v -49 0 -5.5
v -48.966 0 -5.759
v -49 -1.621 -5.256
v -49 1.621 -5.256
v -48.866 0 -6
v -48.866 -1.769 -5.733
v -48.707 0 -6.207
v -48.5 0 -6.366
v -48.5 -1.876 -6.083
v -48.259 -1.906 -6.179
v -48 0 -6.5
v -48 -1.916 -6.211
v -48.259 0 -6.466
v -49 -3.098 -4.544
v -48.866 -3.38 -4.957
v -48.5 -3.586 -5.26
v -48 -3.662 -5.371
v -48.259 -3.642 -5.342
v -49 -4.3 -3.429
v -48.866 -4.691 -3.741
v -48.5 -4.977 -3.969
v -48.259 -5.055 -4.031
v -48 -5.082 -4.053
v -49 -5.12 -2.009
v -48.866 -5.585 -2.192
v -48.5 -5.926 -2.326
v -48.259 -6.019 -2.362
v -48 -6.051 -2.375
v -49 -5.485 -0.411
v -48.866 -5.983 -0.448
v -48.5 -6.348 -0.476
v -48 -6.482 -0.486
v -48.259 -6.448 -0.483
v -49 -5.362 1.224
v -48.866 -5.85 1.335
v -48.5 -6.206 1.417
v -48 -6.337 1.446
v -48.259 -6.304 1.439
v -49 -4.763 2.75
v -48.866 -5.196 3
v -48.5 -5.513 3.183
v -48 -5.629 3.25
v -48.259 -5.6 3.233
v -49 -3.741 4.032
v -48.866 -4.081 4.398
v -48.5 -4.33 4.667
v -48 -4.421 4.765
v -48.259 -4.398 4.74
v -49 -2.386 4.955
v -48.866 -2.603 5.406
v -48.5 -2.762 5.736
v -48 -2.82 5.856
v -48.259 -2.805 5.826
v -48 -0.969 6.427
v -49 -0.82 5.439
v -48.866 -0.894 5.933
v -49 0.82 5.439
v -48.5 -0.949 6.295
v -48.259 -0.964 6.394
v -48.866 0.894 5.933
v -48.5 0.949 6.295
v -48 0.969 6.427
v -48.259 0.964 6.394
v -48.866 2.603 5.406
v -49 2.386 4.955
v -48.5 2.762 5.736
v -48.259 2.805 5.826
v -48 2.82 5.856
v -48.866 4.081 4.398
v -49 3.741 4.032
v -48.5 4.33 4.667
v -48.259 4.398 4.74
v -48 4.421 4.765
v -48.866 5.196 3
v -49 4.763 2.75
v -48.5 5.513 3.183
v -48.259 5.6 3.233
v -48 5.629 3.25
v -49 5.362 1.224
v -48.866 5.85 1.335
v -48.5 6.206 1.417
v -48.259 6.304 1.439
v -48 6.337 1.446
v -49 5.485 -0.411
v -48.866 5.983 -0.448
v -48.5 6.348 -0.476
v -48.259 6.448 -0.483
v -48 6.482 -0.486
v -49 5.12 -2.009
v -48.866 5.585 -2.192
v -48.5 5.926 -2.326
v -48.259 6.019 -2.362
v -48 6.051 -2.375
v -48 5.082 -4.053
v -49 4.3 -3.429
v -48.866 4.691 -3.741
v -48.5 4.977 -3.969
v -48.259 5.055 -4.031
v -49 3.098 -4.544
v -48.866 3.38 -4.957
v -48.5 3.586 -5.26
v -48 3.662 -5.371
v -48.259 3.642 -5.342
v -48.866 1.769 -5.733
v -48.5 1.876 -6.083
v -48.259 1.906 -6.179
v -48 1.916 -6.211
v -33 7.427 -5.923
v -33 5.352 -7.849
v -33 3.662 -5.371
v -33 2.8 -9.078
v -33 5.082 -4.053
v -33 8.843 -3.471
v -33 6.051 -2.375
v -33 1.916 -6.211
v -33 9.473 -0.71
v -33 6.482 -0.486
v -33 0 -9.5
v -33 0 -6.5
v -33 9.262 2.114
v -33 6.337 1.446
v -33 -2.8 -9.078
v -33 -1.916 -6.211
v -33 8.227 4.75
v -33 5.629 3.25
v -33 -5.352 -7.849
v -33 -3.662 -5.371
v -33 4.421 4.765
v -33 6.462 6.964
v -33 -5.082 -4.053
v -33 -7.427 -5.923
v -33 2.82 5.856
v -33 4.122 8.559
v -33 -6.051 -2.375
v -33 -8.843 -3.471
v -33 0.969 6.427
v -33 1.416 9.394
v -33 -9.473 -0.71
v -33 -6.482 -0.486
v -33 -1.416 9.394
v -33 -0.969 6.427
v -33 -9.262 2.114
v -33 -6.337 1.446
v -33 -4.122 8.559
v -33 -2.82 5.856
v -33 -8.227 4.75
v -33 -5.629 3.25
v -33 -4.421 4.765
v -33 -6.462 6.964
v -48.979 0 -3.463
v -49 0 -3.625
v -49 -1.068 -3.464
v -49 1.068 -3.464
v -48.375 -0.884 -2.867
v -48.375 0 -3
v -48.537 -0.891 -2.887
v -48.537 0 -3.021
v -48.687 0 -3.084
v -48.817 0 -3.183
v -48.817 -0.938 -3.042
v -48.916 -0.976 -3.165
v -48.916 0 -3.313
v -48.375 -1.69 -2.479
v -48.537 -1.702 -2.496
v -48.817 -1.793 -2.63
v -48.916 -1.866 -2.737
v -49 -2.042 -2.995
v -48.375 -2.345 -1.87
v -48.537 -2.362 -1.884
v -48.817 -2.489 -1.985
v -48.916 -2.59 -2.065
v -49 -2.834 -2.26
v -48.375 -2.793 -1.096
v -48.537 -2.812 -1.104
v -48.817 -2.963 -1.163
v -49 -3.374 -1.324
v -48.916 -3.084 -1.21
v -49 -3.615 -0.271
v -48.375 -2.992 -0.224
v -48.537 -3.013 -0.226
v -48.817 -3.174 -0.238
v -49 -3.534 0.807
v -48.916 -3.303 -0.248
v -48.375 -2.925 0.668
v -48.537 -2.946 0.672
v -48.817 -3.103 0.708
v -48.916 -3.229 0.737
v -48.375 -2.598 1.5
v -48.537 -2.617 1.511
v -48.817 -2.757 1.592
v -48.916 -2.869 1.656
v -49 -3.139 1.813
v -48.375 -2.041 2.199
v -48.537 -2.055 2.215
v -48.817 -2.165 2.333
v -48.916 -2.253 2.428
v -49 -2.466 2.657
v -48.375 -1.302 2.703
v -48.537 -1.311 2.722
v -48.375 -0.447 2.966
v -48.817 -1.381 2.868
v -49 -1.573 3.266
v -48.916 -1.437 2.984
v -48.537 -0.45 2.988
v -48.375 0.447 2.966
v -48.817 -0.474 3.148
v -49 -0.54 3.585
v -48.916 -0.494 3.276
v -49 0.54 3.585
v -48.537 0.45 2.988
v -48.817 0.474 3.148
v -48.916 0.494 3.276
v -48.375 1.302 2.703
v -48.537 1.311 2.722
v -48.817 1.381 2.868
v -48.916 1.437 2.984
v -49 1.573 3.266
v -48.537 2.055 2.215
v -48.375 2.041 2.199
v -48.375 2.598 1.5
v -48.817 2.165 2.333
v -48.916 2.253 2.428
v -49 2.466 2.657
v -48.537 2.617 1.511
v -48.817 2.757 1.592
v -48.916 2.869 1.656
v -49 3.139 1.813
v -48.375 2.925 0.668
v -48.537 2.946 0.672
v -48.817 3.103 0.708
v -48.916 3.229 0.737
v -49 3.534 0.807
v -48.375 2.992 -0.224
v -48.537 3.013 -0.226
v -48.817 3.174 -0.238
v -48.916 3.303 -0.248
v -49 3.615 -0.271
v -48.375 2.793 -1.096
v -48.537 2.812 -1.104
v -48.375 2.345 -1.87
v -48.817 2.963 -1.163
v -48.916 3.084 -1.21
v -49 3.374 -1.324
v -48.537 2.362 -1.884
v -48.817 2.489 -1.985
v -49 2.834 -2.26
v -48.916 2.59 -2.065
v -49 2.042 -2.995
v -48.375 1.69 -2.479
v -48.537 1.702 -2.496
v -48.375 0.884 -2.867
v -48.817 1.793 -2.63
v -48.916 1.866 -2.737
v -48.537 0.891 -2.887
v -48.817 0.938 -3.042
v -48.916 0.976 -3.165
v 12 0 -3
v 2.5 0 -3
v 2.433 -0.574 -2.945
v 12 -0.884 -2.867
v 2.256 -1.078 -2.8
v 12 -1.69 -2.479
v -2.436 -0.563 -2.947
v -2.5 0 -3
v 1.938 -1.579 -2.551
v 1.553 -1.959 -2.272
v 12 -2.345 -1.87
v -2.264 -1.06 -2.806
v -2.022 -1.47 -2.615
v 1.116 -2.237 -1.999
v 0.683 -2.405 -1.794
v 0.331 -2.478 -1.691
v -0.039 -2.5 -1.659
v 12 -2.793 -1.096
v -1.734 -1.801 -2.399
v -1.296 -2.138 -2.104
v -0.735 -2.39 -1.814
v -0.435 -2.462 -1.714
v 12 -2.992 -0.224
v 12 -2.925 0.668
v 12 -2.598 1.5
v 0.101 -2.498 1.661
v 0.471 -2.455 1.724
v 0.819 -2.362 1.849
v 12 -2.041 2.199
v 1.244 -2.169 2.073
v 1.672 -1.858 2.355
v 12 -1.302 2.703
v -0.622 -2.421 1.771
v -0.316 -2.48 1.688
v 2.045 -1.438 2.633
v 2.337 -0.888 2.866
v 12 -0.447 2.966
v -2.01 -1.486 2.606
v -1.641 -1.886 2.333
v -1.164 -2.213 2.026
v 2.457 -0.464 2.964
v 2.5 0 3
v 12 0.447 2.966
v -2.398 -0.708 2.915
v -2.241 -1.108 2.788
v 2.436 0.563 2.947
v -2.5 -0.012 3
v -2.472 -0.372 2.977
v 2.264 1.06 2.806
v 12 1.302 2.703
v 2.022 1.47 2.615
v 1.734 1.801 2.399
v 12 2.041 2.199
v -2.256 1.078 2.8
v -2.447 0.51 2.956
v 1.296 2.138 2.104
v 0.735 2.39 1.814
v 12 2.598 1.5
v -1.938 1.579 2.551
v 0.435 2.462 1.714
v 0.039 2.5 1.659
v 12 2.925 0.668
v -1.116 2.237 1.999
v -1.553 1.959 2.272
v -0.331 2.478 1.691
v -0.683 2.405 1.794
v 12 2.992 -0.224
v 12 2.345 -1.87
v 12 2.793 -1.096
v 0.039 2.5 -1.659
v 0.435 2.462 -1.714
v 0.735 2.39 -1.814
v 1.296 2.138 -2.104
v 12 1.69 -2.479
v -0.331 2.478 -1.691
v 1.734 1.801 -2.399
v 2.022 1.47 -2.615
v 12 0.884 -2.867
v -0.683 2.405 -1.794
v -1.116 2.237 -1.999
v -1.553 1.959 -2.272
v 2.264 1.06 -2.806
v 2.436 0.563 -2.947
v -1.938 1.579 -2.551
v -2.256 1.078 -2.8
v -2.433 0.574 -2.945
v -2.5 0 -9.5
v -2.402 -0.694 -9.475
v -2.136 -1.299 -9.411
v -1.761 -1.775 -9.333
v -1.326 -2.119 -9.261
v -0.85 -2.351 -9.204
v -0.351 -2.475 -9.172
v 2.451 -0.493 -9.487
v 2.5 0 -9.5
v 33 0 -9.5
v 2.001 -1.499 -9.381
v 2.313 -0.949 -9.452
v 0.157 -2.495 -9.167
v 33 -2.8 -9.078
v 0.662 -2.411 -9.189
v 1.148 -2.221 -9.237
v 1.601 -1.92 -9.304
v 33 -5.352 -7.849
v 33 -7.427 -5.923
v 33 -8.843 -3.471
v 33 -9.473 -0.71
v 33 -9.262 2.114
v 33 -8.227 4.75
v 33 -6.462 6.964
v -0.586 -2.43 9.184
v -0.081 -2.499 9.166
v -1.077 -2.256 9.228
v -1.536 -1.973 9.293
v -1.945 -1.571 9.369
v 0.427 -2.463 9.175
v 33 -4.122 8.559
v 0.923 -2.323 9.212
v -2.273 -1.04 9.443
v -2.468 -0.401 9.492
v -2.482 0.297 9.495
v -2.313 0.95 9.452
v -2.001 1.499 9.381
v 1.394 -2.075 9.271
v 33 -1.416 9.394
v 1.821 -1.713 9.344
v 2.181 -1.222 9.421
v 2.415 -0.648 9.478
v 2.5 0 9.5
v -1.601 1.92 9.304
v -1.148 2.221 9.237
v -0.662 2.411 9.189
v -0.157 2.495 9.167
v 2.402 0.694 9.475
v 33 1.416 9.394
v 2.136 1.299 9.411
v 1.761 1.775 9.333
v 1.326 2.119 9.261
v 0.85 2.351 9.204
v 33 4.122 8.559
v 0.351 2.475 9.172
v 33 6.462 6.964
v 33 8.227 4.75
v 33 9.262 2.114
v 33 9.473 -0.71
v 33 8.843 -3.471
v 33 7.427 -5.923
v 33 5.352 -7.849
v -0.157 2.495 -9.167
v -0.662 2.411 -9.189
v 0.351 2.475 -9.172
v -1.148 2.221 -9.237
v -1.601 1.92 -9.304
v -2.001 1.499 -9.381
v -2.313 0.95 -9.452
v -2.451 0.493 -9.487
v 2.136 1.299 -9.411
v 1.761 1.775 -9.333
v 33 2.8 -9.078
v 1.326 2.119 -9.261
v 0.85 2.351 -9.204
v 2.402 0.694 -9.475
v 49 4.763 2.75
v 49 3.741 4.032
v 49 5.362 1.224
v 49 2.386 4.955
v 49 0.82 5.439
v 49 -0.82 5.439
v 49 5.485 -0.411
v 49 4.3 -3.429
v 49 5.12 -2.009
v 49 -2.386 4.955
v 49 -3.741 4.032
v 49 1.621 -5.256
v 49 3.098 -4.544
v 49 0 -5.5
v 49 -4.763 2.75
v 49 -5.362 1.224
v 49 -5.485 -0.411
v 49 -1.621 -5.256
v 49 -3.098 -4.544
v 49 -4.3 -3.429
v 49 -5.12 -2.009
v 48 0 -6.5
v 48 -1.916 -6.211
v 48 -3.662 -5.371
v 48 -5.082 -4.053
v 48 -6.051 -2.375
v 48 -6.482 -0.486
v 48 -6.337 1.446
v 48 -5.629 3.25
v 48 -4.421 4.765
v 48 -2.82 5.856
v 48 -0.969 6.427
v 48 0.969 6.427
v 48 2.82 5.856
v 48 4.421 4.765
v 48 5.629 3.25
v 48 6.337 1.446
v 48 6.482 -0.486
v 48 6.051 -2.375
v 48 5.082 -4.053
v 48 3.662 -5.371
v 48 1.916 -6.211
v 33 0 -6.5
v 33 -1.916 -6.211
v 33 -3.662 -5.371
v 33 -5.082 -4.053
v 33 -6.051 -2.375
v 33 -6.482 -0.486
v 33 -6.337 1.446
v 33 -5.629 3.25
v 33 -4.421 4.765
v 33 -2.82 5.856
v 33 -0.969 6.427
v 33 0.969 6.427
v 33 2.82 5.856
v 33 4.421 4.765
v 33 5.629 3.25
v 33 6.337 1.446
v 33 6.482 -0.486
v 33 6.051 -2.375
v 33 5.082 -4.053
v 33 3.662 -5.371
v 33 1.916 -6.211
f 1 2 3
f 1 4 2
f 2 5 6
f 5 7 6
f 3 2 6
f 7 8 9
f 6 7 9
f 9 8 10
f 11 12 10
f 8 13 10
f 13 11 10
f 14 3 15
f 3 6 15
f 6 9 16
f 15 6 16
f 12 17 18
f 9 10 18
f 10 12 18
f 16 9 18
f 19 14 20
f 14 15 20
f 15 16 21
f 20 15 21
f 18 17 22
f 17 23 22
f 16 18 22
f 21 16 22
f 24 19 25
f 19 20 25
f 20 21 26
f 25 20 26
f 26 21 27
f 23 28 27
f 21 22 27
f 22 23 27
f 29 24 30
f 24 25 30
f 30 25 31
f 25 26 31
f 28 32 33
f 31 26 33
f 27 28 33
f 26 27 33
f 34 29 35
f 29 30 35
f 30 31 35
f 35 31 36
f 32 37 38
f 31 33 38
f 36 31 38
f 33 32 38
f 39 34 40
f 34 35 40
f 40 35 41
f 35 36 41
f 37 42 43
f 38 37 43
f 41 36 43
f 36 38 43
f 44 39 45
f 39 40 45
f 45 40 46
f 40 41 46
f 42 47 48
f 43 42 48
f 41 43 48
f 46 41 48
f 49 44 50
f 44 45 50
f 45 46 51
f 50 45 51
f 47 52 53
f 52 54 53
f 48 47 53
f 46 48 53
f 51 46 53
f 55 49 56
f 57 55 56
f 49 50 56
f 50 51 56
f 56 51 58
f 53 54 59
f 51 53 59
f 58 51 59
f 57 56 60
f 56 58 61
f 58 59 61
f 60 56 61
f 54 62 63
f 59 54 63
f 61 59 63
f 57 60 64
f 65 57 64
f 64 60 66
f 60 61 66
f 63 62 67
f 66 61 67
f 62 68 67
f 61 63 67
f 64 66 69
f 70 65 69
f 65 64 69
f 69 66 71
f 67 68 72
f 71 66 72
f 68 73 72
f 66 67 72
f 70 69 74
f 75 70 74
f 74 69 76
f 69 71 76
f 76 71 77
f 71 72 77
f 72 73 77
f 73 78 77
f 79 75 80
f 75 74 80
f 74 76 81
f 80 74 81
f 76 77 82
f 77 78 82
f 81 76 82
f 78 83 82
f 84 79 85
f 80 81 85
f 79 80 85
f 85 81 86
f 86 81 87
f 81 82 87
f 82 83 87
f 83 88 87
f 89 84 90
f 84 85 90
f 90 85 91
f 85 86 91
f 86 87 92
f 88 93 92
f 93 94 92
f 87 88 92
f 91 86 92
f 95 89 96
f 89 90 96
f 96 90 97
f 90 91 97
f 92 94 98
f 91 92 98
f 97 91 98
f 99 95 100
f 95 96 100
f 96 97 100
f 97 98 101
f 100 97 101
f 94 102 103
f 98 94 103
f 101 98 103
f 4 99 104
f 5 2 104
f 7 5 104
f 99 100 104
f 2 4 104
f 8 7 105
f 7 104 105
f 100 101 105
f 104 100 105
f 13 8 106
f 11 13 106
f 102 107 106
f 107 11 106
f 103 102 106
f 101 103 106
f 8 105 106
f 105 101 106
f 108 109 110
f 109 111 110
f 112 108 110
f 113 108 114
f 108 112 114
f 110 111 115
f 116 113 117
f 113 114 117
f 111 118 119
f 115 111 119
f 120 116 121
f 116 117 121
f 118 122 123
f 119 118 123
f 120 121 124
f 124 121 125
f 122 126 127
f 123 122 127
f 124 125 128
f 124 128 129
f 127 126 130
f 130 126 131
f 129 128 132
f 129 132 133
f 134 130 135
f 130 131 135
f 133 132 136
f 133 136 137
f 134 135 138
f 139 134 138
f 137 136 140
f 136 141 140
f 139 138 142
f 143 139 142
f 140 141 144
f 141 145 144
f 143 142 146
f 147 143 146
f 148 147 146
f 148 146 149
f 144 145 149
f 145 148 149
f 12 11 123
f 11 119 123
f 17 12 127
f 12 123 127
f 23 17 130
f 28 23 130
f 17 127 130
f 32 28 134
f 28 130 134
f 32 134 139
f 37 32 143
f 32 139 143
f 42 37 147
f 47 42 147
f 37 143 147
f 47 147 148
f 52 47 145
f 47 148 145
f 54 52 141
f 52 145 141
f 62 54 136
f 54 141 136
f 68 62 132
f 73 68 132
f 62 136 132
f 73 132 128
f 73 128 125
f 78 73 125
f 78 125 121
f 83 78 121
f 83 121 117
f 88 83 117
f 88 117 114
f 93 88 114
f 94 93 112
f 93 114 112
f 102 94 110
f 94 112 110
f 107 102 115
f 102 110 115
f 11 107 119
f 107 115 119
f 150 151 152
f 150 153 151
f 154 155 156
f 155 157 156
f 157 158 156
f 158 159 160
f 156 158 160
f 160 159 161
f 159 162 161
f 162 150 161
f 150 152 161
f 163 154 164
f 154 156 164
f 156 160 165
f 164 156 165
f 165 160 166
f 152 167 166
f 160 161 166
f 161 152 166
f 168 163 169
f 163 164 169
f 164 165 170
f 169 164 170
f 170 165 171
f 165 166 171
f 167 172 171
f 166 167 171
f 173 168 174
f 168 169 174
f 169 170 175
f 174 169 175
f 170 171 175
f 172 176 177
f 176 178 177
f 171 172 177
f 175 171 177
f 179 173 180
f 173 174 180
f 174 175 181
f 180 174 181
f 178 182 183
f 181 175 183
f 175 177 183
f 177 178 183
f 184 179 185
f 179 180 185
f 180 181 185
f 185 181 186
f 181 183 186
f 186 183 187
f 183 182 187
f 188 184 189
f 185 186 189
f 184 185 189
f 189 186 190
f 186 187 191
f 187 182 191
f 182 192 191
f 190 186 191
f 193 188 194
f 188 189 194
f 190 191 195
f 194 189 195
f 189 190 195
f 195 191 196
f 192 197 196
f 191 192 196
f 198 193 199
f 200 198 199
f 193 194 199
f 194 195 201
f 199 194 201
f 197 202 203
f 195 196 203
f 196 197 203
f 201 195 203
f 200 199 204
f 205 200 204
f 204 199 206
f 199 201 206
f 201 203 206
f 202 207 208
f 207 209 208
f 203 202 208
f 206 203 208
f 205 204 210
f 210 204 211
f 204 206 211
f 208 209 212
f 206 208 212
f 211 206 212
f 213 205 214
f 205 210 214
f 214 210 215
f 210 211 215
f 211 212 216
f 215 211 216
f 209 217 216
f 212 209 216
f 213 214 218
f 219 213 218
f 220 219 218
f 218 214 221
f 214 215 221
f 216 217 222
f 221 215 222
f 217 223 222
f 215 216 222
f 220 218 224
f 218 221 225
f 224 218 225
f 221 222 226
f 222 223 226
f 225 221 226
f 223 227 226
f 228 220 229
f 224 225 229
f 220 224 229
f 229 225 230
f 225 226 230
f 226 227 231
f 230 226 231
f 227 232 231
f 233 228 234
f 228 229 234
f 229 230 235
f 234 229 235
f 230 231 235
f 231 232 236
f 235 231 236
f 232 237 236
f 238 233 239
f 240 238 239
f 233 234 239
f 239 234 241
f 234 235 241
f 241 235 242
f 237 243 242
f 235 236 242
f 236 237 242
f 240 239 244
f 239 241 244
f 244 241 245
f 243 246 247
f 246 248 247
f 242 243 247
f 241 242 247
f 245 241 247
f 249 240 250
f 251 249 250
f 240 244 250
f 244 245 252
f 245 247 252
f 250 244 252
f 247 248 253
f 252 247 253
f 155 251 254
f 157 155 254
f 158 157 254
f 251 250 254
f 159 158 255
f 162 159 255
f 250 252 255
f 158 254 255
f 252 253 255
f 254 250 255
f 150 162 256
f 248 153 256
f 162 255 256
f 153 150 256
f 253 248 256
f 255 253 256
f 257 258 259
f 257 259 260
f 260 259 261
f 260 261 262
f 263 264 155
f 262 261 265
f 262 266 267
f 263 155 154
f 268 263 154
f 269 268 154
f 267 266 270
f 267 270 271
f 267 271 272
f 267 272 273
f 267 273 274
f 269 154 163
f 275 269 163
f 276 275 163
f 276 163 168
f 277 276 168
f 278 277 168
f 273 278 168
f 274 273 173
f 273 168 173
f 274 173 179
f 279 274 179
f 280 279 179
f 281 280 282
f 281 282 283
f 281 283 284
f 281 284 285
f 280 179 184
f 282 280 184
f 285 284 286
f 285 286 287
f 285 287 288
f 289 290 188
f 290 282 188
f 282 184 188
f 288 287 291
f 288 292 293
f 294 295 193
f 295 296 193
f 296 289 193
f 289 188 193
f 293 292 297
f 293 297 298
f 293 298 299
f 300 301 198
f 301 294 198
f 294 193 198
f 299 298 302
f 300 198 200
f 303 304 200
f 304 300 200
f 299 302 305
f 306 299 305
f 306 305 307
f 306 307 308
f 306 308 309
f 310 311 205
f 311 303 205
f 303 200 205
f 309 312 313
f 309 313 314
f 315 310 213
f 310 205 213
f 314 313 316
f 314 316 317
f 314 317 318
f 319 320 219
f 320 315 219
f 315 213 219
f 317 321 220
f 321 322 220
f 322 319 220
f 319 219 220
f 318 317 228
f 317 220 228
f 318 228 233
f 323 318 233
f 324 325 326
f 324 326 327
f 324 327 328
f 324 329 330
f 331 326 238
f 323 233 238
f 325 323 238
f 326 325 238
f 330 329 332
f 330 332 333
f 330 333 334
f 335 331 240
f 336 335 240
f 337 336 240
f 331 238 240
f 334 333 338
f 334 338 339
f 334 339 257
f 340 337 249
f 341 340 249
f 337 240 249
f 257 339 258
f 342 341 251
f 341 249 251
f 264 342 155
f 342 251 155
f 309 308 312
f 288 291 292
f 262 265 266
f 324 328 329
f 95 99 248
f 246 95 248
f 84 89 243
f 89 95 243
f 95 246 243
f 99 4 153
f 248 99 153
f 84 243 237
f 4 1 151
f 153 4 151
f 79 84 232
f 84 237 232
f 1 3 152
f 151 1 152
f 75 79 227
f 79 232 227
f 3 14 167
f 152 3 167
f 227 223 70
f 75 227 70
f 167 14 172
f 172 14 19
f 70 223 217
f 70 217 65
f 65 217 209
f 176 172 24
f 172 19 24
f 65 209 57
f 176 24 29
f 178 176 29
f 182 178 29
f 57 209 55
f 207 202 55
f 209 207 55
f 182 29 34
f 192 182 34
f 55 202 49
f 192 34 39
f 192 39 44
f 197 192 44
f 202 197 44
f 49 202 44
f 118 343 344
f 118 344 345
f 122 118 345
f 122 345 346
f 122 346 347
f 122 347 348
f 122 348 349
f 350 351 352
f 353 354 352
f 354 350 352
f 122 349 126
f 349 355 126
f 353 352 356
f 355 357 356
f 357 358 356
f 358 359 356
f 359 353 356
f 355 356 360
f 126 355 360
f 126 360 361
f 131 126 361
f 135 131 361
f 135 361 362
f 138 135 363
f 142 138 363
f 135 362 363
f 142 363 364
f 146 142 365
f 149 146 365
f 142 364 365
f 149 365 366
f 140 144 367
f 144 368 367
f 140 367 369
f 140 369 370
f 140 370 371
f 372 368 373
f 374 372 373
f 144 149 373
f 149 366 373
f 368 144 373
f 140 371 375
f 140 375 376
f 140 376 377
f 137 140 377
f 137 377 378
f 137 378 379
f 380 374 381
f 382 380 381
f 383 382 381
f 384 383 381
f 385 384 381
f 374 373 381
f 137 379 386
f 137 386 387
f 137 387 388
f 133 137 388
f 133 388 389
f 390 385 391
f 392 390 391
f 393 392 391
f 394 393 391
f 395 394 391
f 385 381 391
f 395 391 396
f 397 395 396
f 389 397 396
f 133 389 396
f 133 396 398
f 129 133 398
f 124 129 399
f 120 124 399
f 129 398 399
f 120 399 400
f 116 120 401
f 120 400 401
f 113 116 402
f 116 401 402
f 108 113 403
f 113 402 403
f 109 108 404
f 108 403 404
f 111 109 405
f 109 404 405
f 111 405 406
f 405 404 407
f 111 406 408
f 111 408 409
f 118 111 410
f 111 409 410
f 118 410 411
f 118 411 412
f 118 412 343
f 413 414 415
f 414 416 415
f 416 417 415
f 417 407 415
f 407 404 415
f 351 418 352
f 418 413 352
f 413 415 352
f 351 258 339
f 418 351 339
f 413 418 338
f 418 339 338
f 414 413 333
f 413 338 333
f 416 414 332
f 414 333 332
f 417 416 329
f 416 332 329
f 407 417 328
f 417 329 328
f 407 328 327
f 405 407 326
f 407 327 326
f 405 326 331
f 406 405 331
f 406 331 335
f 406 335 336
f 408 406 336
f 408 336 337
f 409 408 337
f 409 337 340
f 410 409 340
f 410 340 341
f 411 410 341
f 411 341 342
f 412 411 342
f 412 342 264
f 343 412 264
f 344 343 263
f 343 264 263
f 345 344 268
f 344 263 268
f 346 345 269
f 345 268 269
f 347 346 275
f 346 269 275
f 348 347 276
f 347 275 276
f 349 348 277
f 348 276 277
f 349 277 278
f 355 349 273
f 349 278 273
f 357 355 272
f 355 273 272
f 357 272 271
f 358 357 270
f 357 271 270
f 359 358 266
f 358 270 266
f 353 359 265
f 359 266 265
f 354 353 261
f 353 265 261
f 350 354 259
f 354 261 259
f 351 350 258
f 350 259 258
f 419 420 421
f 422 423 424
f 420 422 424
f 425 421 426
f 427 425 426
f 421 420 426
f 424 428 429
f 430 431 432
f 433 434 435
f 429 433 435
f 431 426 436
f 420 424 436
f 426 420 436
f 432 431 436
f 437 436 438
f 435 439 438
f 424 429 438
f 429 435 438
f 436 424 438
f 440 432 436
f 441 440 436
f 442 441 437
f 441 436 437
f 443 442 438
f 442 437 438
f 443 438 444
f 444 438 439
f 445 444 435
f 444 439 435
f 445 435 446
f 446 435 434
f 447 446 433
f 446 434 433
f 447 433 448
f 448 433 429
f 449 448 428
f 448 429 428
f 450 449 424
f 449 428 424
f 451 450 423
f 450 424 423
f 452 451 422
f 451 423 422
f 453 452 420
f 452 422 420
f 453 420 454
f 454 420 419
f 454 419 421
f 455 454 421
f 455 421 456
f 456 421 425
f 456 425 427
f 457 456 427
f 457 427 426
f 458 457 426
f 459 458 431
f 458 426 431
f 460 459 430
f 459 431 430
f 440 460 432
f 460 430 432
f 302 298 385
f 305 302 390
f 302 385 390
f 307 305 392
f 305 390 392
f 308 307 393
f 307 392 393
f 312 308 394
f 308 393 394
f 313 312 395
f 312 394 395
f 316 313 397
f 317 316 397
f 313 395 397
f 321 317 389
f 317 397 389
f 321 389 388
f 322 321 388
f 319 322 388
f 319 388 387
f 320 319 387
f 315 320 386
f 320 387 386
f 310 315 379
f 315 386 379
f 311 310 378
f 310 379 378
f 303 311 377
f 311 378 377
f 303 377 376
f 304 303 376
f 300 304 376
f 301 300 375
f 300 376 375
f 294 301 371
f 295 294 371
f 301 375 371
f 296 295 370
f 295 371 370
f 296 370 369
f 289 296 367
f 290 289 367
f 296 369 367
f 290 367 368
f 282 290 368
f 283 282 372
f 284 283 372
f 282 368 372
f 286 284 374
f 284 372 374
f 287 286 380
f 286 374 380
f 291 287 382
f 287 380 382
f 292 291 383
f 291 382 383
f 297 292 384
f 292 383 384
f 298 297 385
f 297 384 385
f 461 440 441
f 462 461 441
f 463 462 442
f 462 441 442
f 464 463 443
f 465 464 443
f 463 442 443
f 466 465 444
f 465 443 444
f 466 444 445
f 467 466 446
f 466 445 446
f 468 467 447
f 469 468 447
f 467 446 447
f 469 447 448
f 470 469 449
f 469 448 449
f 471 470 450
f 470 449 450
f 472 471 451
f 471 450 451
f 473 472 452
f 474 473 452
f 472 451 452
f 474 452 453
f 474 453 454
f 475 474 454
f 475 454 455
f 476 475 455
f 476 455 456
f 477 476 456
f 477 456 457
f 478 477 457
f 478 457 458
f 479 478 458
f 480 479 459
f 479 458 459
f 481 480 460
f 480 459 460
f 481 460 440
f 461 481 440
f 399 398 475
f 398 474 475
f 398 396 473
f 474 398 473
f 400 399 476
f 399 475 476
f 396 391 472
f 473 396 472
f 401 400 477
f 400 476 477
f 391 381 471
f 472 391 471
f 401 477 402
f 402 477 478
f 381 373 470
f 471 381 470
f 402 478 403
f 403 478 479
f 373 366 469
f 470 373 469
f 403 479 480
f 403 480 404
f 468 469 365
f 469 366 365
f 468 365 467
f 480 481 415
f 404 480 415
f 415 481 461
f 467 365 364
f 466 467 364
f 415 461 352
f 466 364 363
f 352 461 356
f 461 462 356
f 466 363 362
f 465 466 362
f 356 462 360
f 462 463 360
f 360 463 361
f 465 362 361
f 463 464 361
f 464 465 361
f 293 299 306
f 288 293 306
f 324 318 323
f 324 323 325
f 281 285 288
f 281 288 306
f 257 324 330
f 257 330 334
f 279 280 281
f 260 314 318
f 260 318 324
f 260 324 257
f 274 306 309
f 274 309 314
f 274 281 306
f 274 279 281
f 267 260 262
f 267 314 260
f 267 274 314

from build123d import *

# Parameters (mm, degrees)
CHAMFER1_SIZE      = 1
SKETCH5_R          = 3
CUT_EXTRUDE1_DEPTH = 60
SKETCH7_R          = 2.5
CUT_EXTRUDE2_DEPTH = 25


with BuildPart() as part:
    # Sketch3 → Revolve1 (revolve)
    with BuildSketch(Plane(origin=(0, 0, 0), x_dir=(1, 0, 0), z_dir=(0, 1, 0))):
        with BuildLine():
            Line((-33, 9.5), (33, 9.5))
            Line((33, 9.5), (33, 6.5))
            Line((33, 6.5), (49, 6.5))
            Line((49, 6.5), (49, 0))
            Line((49, 0), (-48, 0))
            Line((-48, 0), (-48, 3))
            Line((-48, 3), (-48.375, 3))
            ThreePointArc((-48.375, 3), (-48.816941738, 3.183058262), (-49, 3.625))
            Line((-49, 3.625), (-49, 5.5))
            ThreePointArc((-49, 5.5), (-48.707106781, 6.207106781), (-48, 6.5))
            Line((-48, 6.5), (-33, 6.5))
            Line((-33, 6.5), (-33, 9.5))
        make_face()
    revolve(axis=Axis((49, 0, 0), (-1, 0, 0)))

    # Chamfer1
    chamfer1_edges = [part.edges().sort_by_distance(p)[0] for p in [
        (49, 0, 6.5),
    ]]
    chamfer(chamfer1_edges, length=CHAMFER1_SIZE)

    # Sketch5 → Cut-Extrude1 (cut)
    with BuildSketch(Plane.ZY.offset(48)):
        with Locations(Location((0, 0, 0), (0, 0, 180))):
            Circle(SKETCH5_R)
    extrude(amount=-CUT_EXTRUDE1_DEPTH, mode=Mode.SUBTRACT)

    # Sketch7 → Cut-Extrude2 (cut, symmetric)
    with BuildSketch(Plane.XY):
        Circle(SKETCH7_R)
    extrude(amount=CUT_EXTRUDE2_DEPTH, both=True, mode=Mode.SUBTRACT)


solid = part.part
